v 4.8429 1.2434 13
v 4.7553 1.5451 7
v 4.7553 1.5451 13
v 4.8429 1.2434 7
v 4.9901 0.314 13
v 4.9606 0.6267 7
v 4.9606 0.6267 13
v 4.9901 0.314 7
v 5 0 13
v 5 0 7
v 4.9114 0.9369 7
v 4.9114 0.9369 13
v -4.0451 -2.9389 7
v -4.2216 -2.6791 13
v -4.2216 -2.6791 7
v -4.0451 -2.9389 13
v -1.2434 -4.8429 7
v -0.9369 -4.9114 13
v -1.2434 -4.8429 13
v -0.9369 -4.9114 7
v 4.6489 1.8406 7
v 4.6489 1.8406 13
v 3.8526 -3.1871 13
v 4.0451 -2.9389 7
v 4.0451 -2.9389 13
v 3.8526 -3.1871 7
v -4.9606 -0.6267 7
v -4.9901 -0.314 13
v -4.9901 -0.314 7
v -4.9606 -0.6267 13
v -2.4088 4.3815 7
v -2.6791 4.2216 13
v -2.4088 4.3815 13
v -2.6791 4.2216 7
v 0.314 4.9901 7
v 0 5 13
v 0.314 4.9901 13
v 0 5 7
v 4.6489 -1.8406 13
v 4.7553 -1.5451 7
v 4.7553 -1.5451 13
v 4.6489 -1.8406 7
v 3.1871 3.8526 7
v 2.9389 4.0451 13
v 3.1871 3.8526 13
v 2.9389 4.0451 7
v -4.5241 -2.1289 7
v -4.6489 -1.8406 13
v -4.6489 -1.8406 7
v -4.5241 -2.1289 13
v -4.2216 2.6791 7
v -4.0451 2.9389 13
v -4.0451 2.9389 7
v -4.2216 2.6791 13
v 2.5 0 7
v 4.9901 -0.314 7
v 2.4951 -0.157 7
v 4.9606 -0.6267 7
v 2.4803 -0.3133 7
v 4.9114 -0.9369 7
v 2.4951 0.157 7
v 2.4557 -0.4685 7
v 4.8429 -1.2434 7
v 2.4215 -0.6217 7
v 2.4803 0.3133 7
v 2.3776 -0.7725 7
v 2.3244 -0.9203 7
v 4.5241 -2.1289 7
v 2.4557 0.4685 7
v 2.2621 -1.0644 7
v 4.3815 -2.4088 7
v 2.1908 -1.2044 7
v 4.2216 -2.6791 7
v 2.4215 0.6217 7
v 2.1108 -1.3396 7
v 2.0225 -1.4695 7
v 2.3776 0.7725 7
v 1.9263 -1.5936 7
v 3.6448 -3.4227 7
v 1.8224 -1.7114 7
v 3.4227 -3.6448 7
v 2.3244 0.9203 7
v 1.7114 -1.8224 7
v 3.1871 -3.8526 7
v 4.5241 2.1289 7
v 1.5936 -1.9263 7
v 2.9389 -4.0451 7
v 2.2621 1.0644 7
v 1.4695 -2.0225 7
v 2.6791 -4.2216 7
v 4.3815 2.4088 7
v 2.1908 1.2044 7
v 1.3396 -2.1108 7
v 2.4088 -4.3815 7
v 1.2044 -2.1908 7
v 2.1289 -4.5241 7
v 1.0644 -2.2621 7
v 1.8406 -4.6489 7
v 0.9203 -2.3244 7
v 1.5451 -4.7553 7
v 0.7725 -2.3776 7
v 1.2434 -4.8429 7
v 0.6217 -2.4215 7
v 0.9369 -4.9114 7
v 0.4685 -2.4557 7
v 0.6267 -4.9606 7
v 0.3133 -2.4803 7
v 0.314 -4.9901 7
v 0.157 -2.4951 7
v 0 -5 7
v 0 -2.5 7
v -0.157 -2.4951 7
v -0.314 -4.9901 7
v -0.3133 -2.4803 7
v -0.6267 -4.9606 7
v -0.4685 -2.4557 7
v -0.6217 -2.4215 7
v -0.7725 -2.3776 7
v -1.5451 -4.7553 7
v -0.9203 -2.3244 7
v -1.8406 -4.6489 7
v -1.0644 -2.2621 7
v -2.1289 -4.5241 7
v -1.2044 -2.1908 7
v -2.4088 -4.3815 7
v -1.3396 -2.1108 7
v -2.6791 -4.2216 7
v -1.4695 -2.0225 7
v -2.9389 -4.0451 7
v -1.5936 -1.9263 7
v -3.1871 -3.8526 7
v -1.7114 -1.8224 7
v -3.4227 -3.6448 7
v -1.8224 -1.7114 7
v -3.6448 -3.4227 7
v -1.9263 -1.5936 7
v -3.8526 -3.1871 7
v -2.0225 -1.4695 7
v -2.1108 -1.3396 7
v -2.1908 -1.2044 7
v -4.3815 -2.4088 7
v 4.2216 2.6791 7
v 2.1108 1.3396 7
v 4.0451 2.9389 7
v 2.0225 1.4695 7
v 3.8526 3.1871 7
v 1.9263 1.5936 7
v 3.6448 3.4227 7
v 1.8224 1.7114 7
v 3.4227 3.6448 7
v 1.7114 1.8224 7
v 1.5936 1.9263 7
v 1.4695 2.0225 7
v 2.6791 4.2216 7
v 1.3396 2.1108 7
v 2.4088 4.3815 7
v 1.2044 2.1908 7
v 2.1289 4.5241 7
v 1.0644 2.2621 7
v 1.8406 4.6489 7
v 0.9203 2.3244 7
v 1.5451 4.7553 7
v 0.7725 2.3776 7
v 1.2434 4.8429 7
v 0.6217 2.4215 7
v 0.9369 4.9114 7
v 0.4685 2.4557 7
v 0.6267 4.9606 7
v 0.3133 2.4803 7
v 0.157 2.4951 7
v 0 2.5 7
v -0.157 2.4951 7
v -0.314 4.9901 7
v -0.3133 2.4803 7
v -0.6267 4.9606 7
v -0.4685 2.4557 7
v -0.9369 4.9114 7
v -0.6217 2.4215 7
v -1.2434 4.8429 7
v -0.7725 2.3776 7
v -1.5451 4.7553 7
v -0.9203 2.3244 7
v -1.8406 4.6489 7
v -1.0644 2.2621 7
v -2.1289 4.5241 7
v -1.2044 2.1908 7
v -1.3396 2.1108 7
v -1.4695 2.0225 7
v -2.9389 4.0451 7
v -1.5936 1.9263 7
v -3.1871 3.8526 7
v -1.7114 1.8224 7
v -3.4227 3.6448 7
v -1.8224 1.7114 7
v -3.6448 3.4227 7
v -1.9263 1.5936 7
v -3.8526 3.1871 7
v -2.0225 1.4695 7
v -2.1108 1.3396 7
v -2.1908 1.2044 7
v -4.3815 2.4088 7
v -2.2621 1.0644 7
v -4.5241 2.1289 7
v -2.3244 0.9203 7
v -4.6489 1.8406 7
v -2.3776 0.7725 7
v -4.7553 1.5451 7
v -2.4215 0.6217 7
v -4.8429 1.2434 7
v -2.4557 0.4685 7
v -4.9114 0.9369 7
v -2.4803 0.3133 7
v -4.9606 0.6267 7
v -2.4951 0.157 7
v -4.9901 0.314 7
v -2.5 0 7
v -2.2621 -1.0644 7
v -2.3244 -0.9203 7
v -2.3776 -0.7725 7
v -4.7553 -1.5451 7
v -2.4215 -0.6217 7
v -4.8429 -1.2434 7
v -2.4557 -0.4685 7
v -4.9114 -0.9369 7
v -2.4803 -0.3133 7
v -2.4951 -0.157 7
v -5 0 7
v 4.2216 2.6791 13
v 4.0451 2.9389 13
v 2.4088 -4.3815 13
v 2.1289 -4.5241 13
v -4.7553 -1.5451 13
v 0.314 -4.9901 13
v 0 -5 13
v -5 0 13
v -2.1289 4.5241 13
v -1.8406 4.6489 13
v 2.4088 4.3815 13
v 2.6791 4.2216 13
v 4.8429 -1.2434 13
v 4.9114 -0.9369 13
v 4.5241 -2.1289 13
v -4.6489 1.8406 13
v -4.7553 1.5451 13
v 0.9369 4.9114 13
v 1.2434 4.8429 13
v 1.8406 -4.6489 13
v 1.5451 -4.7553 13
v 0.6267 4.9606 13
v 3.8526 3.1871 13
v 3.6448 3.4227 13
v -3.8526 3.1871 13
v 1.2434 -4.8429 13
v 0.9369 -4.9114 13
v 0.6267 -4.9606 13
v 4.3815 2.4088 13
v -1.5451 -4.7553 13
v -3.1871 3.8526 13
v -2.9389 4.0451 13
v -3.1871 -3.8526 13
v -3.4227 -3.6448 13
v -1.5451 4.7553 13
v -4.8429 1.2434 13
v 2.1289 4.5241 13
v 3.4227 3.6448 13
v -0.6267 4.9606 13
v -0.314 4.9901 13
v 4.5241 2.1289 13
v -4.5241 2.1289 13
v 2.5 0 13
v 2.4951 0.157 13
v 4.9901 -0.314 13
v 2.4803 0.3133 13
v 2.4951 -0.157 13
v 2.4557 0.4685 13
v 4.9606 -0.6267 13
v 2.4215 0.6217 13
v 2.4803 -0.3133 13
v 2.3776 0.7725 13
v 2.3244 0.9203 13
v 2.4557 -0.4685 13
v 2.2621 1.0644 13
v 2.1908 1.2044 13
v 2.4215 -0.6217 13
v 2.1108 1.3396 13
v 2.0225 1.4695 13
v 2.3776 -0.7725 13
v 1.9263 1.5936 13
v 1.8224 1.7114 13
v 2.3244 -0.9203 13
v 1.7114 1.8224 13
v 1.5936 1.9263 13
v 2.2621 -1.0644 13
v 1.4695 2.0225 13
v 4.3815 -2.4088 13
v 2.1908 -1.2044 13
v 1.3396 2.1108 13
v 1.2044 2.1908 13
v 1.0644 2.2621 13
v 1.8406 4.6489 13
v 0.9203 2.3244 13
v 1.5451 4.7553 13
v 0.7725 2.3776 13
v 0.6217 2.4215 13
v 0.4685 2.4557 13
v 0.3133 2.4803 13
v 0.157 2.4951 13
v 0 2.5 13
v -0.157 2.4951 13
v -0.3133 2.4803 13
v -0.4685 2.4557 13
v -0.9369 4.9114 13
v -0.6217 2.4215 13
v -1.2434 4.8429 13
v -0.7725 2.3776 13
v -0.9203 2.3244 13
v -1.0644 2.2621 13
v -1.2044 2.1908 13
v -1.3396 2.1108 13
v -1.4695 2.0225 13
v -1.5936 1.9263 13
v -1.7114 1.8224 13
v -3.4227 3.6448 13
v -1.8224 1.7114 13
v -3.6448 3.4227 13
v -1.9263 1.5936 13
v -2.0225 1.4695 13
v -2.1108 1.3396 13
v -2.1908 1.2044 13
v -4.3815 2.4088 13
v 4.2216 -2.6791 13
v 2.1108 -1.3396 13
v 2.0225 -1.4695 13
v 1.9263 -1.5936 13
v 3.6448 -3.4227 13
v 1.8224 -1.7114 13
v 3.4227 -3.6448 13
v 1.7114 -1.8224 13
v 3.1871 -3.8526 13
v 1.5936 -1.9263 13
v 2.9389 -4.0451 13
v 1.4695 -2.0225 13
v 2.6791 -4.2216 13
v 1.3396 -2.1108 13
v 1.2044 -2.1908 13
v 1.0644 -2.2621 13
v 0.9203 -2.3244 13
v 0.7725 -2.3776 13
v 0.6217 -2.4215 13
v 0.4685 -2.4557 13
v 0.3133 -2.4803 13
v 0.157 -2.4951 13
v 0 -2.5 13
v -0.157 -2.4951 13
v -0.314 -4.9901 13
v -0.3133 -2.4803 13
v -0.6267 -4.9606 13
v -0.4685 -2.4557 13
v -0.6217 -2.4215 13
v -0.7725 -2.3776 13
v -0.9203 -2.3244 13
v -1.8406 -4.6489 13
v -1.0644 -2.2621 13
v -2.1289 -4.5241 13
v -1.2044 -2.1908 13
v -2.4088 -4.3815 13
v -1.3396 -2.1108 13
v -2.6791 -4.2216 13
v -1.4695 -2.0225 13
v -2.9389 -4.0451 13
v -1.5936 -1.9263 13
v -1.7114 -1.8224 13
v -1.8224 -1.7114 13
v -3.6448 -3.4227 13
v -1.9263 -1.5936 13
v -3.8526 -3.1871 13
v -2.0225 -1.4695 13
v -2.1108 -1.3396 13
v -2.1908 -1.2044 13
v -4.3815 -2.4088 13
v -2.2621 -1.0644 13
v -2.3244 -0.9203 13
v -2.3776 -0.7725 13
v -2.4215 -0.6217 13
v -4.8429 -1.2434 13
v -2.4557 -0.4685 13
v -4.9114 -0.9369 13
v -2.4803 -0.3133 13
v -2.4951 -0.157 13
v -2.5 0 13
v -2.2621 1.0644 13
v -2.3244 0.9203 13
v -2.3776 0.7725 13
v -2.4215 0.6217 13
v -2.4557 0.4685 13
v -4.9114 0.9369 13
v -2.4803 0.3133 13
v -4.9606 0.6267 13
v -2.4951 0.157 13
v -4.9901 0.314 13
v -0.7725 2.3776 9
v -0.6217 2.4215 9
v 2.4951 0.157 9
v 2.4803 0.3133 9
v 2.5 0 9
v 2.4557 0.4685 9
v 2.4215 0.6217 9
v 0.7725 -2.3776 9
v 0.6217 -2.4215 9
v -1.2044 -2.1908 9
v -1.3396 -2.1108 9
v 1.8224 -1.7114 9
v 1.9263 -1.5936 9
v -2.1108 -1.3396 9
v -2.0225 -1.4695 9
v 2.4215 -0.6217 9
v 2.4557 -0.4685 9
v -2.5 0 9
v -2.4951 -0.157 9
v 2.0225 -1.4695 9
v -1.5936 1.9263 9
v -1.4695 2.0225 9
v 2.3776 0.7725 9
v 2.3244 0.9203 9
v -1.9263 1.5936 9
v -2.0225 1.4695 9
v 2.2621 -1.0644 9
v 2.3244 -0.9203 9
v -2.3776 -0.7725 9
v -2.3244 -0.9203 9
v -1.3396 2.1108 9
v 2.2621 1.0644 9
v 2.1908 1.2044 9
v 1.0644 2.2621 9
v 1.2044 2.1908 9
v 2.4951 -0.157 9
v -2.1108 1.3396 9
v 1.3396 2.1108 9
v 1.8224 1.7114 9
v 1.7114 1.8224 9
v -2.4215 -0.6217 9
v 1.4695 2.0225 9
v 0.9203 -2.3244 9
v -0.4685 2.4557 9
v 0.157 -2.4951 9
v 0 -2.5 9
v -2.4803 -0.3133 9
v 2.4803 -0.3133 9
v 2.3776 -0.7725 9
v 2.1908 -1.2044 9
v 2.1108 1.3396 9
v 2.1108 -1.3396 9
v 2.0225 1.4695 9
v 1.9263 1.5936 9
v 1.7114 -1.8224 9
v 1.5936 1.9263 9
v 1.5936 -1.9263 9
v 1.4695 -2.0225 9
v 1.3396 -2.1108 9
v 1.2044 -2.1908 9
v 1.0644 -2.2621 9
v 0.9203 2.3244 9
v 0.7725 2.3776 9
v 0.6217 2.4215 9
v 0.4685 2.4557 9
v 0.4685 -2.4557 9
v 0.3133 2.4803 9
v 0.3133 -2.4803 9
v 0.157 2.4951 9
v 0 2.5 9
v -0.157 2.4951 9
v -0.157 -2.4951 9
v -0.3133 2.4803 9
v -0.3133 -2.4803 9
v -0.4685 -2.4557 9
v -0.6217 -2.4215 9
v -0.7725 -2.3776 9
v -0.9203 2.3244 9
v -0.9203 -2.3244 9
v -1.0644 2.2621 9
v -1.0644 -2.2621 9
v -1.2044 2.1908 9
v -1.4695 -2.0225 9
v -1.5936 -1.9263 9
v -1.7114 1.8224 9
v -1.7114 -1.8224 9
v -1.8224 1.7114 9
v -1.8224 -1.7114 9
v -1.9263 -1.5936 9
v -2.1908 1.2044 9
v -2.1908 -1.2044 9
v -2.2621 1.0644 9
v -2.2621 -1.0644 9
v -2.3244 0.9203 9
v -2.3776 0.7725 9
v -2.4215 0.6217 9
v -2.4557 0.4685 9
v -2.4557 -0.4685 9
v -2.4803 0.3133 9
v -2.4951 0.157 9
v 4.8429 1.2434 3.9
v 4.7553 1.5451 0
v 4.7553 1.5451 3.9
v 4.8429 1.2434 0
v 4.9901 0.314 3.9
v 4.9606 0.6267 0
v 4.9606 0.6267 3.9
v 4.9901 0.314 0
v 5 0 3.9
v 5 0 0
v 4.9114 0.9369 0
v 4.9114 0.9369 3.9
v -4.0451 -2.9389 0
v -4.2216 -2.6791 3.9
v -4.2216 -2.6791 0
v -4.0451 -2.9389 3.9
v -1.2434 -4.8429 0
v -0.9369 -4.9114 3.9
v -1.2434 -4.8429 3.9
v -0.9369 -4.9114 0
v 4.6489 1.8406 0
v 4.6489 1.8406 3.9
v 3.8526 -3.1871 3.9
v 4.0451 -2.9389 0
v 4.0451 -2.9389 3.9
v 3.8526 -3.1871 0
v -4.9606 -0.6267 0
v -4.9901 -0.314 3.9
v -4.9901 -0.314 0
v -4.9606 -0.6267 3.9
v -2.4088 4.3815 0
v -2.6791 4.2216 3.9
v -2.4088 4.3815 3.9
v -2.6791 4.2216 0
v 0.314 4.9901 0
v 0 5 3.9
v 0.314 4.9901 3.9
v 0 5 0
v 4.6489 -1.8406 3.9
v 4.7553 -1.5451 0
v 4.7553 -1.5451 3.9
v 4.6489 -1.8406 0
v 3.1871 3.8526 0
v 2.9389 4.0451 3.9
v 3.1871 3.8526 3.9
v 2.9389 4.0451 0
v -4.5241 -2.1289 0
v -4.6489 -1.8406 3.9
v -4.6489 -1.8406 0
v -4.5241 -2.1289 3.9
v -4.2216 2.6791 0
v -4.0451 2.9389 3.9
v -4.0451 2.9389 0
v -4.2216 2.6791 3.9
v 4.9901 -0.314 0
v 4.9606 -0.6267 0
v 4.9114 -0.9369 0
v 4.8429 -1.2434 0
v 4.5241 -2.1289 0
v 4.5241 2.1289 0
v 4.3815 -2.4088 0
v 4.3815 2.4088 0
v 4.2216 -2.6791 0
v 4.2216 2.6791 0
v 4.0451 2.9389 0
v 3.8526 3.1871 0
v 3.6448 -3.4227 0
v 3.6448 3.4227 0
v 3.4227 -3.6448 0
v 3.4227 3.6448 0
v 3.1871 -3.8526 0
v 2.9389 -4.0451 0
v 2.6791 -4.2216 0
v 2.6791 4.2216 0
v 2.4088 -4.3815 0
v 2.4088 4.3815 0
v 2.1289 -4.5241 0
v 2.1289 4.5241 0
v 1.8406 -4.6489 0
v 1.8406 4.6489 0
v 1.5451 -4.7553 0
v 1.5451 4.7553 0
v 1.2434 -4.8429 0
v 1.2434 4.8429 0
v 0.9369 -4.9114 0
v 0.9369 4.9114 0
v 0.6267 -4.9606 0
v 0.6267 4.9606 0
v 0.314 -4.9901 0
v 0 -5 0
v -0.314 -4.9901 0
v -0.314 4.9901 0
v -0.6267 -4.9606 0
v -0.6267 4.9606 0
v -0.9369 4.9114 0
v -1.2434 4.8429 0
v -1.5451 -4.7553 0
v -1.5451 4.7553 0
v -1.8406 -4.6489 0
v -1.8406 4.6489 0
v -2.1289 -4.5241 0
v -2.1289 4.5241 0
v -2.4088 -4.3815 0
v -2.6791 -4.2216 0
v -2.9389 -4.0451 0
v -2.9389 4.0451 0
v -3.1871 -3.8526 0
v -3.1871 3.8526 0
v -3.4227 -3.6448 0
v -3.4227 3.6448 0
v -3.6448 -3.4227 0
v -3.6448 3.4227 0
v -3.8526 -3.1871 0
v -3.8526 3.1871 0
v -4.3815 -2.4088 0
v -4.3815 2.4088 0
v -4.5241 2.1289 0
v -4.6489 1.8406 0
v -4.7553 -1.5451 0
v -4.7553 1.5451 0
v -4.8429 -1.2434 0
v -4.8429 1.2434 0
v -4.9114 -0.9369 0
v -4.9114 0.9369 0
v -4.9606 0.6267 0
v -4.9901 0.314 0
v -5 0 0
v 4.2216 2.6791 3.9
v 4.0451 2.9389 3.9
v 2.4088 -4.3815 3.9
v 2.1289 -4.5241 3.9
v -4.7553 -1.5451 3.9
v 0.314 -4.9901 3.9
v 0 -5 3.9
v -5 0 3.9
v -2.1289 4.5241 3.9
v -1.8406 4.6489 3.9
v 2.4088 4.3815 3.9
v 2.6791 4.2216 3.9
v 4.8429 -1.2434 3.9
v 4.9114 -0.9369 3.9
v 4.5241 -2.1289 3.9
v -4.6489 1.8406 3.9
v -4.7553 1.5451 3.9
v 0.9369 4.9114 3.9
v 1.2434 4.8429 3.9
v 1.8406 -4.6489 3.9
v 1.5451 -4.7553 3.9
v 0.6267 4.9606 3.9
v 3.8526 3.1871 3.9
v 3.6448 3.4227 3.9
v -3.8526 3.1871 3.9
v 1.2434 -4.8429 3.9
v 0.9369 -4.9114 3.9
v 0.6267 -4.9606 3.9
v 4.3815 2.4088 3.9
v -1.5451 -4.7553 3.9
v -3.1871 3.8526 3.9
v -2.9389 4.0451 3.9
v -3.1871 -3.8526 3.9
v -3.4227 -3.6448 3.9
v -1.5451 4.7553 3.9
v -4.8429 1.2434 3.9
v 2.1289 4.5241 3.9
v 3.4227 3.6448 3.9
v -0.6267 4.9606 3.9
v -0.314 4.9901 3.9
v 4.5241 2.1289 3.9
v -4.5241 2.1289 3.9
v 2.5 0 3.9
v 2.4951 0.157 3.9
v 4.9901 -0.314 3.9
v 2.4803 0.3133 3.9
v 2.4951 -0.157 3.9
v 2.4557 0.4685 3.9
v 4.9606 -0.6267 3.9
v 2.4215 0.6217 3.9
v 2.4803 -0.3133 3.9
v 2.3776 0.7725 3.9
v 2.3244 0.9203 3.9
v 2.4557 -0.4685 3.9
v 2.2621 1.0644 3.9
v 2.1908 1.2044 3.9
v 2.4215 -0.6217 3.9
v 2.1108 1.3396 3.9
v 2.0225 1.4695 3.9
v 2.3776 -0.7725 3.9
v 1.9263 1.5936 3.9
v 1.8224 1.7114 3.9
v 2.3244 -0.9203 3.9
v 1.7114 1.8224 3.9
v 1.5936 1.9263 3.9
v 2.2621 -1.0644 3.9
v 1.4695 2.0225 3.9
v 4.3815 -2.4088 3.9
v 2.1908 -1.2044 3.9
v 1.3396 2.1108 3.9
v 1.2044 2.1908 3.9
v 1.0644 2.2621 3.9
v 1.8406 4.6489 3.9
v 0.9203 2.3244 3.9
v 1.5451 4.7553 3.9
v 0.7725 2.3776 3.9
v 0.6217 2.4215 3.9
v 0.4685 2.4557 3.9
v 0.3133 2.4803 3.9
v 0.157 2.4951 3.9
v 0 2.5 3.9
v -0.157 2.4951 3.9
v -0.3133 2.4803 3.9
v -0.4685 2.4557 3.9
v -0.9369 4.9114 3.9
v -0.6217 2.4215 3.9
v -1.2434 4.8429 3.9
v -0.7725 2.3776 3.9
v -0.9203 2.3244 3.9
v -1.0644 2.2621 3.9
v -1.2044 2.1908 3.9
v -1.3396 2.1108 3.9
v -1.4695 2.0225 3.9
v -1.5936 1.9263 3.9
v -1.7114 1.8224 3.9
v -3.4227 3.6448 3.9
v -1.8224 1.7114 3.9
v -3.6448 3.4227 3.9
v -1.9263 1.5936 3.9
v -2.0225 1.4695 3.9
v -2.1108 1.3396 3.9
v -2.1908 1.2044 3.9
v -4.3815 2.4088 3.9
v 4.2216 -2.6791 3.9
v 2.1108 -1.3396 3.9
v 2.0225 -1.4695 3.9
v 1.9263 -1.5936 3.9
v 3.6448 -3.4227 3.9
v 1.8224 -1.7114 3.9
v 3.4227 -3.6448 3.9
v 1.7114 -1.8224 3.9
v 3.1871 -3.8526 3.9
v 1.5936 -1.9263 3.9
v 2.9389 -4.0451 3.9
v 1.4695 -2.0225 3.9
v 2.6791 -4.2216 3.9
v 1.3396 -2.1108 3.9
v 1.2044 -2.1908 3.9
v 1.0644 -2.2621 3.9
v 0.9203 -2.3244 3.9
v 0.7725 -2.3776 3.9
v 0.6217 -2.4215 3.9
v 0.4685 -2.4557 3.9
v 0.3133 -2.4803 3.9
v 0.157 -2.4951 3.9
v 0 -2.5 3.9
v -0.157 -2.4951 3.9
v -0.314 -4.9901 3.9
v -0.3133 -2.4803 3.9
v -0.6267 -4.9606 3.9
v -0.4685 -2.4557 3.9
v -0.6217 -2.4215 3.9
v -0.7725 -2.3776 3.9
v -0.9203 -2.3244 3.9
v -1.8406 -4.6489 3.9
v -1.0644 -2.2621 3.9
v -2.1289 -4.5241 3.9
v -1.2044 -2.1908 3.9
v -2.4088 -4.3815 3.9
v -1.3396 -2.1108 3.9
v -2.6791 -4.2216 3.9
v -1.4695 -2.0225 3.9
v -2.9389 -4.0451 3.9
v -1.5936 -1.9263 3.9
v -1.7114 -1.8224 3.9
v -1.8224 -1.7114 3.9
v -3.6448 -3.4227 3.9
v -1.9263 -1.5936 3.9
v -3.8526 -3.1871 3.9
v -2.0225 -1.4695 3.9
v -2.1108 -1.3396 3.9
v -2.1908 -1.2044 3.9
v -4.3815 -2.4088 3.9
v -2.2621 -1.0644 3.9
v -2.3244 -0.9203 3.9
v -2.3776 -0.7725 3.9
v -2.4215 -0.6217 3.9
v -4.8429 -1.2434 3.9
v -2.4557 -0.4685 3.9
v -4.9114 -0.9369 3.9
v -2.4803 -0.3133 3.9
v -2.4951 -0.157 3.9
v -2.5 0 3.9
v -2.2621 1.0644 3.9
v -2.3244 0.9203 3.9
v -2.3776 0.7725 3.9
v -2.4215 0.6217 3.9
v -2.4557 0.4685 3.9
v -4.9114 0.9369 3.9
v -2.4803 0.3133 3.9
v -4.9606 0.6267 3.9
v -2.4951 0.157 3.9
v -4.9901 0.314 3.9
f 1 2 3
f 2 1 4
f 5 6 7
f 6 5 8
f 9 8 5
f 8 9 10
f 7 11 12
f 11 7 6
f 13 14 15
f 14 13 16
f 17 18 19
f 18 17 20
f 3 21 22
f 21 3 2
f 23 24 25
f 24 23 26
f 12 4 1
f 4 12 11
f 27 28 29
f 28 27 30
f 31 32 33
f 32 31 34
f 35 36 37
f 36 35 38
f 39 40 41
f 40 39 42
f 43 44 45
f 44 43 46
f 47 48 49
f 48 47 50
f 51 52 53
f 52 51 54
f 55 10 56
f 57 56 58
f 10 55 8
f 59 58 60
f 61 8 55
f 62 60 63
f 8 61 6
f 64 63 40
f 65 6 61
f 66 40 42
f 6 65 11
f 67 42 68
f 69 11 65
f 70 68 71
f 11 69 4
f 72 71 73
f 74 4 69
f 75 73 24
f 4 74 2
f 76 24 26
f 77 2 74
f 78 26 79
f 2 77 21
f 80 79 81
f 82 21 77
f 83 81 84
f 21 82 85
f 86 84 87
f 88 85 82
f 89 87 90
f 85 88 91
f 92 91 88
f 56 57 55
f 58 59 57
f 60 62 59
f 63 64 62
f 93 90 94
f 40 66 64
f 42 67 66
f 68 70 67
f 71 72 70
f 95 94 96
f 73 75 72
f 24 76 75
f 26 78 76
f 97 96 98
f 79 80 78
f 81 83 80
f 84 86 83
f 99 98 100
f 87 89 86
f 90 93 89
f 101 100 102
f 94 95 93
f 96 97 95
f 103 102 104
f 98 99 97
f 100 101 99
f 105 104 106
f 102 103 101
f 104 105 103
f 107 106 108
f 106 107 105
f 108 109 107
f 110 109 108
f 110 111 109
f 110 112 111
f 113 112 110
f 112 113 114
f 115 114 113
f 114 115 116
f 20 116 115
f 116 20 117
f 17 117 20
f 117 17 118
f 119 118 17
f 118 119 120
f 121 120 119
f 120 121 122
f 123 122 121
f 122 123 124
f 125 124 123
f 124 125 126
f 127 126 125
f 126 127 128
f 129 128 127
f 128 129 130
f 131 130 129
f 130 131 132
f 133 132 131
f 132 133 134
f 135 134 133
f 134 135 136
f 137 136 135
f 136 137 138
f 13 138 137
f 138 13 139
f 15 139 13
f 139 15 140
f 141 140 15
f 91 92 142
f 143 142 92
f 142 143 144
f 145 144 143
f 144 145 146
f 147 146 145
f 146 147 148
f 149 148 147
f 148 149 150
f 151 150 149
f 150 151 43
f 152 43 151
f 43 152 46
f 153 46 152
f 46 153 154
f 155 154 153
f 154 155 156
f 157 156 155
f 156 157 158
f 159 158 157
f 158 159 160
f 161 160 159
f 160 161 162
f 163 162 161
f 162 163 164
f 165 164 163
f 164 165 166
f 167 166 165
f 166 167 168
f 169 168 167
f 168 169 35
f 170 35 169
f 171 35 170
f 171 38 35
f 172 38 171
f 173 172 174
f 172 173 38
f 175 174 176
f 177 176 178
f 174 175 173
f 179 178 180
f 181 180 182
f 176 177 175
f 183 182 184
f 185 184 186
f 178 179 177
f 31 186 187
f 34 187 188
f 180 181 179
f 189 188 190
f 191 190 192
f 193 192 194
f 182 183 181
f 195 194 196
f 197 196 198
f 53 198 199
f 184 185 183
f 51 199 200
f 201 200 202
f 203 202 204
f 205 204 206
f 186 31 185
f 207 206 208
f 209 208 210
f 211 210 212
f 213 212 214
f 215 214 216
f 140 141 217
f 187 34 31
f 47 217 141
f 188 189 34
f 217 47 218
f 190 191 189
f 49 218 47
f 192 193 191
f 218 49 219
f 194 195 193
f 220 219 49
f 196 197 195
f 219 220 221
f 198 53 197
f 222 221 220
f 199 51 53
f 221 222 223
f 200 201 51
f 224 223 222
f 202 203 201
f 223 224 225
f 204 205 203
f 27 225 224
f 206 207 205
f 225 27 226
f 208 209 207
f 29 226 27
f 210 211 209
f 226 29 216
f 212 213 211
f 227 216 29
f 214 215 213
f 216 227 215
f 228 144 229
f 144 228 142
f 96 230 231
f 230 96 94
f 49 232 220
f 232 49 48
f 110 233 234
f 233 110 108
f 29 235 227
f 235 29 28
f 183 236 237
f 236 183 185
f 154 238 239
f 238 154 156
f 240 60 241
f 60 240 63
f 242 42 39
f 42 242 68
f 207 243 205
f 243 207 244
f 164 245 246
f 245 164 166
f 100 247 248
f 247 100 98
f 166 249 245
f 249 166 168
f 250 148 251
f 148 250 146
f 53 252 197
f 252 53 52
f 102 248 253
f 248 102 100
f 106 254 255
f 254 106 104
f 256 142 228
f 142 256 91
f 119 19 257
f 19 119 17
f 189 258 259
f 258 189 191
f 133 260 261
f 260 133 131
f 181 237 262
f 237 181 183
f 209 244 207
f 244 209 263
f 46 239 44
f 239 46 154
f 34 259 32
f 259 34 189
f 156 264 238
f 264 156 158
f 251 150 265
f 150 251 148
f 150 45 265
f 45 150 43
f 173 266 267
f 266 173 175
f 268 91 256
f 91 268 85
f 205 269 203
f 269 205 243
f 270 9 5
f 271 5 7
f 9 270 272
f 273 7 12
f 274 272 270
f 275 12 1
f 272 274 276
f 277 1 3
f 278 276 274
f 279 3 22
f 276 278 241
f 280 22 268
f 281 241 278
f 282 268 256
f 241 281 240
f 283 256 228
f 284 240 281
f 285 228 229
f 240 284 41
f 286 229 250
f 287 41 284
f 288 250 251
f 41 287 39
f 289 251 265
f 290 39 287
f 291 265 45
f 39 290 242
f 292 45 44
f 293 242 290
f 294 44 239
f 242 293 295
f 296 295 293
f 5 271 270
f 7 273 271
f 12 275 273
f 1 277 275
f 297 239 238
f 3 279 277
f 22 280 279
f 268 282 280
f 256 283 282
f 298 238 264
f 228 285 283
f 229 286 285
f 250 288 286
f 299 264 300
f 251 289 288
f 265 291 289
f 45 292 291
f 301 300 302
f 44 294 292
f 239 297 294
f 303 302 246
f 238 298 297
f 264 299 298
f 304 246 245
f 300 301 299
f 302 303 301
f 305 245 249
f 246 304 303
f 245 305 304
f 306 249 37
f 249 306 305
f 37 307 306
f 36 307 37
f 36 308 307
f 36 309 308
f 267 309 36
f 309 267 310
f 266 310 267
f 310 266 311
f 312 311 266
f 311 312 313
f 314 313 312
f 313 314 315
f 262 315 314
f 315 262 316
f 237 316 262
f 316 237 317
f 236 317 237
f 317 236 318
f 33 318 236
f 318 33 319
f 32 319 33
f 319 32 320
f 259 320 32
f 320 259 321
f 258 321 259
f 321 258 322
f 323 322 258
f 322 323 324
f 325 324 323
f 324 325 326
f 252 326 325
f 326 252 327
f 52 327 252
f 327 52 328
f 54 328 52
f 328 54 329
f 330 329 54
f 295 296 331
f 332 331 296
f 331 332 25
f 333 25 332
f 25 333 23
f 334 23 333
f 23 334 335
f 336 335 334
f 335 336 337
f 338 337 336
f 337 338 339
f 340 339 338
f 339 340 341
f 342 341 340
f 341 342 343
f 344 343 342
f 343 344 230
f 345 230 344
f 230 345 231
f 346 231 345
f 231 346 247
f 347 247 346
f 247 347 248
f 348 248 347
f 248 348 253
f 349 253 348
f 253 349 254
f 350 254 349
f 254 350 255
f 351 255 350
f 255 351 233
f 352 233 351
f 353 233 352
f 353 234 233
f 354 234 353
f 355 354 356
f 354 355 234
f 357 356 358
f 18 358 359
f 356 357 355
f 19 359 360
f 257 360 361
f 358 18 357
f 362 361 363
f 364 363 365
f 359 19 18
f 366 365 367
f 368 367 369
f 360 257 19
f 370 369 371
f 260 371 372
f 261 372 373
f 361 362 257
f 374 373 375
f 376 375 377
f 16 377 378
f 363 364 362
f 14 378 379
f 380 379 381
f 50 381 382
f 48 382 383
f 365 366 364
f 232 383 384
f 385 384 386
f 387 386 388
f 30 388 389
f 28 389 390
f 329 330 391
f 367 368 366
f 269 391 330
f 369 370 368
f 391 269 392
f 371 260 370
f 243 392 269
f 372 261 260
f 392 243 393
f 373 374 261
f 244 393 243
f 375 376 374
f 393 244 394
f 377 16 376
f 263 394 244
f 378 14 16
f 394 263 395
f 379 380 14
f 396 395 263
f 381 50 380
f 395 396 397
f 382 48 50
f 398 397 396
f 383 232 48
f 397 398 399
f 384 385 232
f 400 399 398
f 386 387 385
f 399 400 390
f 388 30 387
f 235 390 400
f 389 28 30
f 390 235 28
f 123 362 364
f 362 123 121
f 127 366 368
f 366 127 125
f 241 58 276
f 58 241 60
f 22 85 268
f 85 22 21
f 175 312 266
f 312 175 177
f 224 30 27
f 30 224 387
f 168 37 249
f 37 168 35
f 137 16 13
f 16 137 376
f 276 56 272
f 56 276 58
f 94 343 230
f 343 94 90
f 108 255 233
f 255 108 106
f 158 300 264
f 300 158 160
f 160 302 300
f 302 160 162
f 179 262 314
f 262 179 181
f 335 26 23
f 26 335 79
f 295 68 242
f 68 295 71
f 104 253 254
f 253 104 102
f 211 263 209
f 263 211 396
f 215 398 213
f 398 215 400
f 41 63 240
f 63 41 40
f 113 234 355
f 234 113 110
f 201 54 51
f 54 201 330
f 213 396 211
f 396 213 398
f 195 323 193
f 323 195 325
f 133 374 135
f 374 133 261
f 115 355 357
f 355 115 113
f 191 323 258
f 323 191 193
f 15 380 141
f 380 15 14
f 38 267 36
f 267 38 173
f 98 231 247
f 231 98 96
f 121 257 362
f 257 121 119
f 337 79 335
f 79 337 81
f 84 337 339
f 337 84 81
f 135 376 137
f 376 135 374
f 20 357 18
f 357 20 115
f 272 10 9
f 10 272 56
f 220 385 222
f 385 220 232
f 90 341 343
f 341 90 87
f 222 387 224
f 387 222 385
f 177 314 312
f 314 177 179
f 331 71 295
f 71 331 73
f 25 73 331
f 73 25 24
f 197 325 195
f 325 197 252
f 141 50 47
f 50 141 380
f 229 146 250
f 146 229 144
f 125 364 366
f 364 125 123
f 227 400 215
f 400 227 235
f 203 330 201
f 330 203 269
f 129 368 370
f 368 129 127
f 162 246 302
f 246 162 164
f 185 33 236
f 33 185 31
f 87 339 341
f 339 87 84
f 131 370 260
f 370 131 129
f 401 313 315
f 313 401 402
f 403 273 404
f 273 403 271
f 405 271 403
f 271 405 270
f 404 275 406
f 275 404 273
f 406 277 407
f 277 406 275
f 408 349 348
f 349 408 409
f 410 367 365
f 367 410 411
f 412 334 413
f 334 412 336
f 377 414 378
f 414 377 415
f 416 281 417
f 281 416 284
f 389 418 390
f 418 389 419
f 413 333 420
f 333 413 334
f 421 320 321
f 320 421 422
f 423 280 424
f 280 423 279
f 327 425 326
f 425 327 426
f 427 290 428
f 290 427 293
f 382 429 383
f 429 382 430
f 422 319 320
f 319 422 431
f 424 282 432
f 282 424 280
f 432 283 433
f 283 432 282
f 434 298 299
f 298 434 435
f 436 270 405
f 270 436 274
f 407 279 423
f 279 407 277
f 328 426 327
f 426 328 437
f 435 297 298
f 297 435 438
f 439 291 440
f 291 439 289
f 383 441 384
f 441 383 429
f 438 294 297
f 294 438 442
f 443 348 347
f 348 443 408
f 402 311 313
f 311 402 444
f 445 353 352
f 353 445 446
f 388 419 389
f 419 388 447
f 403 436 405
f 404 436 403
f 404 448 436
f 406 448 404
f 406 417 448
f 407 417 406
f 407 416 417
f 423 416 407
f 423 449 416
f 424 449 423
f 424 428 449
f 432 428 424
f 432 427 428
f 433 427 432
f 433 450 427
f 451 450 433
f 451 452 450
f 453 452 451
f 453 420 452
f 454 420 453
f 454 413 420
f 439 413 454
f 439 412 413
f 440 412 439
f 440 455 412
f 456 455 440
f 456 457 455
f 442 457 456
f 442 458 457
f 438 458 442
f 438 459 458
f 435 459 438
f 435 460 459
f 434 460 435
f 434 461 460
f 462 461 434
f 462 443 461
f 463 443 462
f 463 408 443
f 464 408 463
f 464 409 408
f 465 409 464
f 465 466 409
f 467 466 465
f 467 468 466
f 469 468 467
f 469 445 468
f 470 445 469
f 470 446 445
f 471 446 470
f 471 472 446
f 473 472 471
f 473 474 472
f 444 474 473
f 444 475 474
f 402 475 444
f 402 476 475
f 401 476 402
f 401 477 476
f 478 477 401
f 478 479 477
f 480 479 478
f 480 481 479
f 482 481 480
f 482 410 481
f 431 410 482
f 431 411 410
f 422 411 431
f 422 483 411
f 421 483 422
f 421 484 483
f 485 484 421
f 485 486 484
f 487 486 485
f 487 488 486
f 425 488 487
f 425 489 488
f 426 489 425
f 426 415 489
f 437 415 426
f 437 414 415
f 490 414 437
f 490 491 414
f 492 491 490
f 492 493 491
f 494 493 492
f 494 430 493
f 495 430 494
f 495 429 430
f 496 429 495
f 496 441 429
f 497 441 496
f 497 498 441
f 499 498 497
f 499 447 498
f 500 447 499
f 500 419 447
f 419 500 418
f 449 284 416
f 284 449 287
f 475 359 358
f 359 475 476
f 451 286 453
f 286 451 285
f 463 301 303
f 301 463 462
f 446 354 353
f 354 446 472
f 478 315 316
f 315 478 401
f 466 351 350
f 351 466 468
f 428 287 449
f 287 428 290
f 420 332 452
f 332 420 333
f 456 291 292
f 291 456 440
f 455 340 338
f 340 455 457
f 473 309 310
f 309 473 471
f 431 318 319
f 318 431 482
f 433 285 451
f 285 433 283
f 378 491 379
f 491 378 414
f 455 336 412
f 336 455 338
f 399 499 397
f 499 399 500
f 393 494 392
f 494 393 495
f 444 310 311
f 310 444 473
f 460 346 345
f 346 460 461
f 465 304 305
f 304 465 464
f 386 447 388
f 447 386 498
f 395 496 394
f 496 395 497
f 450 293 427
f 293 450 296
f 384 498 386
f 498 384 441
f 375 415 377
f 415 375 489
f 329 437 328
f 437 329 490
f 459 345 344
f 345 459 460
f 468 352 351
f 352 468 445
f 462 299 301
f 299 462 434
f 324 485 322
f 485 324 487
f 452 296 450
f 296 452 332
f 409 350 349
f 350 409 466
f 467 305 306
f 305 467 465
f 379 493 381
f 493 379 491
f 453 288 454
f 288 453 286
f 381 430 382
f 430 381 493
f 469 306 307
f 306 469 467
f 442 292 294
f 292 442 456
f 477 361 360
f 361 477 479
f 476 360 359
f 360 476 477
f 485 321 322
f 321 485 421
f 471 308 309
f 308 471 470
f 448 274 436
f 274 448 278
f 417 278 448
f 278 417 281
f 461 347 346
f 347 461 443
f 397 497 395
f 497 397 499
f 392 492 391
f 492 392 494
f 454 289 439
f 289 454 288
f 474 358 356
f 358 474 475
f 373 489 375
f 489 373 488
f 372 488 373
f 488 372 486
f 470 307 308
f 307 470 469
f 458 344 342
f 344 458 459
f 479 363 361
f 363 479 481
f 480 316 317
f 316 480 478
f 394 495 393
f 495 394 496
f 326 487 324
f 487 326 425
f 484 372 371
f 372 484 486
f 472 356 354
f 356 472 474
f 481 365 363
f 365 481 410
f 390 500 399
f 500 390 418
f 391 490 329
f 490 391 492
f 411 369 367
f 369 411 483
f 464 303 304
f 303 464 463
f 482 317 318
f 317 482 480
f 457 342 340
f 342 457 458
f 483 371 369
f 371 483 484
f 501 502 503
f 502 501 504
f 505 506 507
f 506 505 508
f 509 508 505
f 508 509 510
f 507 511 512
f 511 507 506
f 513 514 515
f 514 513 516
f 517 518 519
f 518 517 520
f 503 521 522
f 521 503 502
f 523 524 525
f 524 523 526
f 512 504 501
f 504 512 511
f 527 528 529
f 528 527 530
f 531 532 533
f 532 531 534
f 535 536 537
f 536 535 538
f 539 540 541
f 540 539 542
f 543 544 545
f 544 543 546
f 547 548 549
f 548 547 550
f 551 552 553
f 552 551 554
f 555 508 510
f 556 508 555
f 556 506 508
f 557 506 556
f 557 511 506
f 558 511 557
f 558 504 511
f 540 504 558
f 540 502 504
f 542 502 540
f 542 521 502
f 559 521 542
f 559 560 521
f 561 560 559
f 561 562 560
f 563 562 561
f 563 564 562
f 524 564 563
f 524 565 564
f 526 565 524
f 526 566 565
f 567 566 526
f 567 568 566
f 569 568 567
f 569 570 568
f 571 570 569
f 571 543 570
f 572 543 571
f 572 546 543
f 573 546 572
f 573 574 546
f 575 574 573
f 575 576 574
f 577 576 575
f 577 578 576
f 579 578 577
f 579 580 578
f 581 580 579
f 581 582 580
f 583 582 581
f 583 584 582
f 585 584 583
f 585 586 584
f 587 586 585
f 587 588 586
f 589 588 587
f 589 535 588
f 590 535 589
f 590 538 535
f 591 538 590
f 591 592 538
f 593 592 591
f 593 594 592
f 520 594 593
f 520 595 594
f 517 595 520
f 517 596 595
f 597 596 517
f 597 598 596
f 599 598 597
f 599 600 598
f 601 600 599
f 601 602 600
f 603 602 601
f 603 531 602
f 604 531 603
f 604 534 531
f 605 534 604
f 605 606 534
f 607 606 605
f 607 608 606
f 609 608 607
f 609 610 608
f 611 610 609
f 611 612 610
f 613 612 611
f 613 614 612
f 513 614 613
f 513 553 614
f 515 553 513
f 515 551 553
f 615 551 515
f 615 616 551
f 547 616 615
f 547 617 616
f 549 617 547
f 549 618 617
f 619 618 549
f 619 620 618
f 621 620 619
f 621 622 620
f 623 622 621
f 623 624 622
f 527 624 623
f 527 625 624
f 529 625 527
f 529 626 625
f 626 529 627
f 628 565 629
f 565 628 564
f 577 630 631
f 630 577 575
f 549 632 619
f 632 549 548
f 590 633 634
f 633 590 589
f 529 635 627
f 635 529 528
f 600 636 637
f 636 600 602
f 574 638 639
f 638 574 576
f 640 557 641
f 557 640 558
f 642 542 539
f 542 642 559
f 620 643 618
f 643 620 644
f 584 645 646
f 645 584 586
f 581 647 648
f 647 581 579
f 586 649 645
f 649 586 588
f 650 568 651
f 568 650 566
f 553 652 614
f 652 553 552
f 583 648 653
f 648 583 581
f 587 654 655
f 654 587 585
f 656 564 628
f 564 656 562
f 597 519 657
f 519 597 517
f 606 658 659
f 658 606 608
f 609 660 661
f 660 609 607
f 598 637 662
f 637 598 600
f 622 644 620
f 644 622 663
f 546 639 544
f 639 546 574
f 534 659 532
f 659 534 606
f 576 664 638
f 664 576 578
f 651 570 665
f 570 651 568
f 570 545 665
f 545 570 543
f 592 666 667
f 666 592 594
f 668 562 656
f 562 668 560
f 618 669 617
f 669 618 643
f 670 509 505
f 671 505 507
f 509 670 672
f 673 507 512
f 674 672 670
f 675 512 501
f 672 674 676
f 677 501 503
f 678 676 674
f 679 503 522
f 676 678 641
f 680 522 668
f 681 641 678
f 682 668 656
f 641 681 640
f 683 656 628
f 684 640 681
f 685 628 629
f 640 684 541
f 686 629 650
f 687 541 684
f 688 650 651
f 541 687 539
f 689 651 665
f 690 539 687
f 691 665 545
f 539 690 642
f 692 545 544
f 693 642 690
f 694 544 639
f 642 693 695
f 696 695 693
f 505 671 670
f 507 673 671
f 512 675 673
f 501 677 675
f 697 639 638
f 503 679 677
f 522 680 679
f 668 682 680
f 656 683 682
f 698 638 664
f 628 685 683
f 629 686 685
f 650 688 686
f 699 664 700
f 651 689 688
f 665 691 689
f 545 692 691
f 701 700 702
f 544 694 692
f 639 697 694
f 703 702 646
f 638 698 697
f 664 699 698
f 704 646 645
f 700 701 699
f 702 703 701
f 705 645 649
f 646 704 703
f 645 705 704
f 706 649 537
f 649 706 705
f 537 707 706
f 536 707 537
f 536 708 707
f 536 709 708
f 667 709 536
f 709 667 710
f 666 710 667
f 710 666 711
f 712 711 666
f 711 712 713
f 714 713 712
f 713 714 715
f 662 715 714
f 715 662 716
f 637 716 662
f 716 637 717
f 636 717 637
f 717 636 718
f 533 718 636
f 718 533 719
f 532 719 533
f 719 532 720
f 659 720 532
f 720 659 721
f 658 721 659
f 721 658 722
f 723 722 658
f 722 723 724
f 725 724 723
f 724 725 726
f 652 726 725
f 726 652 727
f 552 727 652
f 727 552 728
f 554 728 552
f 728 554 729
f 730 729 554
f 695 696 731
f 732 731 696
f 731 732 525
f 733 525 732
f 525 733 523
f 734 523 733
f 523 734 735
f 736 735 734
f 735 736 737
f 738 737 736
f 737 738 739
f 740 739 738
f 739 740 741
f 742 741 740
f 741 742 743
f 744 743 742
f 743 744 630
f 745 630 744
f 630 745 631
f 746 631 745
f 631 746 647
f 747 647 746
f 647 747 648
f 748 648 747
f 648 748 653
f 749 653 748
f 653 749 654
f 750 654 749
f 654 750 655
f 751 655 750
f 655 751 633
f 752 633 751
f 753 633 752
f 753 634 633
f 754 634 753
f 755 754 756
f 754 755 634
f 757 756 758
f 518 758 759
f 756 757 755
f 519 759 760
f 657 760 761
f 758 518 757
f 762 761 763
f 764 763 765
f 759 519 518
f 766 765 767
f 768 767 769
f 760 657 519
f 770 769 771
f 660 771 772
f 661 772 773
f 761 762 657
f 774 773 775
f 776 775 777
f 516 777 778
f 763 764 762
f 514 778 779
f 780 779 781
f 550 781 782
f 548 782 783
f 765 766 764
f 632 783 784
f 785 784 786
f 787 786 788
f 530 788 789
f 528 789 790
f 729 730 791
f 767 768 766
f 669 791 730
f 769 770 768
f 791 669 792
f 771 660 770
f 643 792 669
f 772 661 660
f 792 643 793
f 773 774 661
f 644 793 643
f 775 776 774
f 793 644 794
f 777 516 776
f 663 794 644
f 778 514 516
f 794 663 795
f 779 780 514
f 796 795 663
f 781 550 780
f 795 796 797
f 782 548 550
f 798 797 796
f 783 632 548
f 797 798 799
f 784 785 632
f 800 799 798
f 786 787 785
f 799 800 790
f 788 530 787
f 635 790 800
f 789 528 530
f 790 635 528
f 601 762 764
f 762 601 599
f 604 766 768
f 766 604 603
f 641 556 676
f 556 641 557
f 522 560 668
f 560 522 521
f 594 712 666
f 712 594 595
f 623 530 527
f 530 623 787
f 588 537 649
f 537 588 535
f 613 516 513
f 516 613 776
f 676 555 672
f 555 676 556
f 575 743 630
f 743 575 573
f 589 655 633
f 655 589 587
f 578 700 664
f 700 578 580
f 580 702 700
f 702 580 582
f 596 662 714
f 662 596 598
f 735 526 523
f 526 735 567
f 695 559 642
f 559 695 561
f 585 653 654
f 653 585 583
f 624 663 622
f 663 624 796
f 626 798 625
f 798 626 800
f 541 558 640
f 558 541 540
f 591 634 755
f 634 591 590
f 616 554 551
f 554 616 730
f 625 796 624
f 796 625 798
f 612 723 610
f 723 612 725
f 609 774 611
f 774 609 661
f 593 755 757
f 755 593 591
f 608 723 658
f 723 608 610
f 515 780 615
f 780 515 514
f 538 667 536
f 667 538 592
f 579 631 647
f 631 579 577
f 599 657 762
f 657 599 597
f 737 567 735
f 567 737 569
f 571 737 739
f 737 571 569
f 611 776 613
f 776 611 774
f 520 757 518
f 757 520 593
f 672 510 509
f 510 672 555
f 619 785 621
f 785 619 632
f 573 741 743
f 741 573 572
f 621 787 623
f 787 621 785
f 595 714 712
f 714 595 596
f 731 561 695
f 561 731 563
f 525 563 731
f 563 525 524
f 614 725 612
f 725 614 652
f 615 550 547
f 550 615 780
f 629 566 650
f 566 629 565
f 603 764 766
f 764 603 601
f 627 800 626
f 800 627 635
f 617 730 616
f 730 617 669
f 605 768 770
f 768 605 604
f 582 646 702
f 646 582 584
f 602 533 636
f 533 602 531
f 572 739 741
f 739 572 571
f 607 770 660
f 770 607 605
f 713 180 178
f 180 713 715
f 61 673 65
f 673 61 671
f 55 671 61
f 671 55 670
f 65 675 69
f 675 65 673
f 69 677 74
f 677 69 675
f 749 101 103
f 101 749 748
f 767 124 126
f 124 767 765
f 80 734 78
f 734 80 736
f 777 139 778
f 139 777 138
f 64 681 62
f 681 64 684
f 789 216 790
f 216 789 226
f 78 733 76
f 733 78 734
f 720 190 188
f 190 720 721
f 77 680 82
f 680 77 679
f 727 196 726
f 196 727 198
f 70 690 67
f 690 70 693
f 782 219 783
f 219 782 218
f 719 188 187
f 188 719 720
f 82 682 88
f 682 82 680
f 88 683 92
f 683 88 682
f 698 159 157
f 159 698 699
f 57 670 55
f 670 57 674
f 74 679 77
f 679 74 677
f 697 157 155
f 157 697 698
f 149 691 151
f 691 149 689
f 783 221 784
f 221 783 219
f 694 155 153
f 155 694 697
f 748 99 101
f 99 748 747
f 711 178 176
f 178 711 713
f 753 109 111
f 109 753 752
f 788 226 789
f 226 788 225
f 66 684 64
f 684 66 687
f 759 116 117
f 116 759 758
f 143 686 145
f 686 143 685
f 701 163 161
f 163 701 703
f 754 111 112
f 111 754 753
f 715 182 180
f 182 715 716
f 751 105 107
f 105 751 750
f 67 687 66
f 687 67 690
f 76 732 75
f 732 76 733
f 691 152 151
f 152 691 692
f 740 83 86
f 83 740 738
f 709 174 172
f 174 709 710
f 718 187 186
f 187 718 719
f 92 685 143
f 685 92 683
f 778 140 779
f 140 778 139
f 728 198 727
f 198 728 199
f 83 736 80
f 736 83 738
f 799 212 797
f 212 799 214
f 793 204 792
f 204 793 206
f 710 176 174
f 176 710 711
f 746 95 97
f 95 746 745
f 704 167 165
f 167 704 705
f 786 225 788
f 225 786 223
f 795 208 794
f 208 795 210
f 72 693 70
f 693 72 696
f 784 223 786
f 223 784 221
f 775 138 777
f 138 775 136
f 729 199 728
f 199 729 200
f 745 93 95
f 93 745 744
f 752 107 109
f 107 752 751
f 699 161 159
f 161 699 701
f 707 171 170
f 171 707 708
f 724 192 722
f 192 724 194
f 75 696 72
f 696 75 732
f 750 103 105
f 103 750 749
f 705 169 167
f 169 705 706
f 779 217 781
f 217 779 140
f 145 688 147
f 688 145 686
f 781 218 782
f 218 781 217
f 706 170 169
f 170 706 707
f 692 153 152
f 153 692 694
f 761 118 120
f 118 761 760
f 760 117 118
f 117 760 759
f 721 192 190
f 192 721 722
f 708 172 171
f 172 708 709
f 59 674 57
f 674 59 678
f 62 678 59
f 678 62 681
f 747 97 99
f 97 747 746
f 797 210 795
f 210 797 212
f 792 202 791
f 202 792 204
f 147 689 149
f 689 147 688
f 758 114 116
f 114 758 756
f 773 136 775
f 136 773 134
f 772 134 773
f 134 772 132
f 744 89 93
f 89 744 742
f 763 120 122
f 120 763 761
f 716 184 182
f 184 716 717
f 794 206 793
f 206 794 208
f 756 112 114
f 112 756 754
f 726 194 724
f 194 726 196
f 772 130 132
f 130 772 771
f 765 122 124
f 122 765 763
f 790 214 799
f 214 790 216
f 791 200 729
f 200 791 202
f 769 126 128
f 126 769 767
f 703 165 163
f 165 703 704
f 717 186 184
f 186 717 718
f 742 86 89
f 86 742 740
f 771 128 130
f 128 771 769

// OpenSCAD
module pino(res){
    folga=0.1; //TESTE AQUI, VEJA SE A FOLGA ESTÁ BOA!
    cylinder(4-folga,5,5,$fn=res);
    cylinder(7,2.5,2.5,$fn=res);
    translate([0,0,7])
    difference(){
        cylinder(6,5,5,$fn=res);
        #translate([0,0,2])cylinder(4,2.5,2.5,$fn=res);
    };
}

pino(100);
